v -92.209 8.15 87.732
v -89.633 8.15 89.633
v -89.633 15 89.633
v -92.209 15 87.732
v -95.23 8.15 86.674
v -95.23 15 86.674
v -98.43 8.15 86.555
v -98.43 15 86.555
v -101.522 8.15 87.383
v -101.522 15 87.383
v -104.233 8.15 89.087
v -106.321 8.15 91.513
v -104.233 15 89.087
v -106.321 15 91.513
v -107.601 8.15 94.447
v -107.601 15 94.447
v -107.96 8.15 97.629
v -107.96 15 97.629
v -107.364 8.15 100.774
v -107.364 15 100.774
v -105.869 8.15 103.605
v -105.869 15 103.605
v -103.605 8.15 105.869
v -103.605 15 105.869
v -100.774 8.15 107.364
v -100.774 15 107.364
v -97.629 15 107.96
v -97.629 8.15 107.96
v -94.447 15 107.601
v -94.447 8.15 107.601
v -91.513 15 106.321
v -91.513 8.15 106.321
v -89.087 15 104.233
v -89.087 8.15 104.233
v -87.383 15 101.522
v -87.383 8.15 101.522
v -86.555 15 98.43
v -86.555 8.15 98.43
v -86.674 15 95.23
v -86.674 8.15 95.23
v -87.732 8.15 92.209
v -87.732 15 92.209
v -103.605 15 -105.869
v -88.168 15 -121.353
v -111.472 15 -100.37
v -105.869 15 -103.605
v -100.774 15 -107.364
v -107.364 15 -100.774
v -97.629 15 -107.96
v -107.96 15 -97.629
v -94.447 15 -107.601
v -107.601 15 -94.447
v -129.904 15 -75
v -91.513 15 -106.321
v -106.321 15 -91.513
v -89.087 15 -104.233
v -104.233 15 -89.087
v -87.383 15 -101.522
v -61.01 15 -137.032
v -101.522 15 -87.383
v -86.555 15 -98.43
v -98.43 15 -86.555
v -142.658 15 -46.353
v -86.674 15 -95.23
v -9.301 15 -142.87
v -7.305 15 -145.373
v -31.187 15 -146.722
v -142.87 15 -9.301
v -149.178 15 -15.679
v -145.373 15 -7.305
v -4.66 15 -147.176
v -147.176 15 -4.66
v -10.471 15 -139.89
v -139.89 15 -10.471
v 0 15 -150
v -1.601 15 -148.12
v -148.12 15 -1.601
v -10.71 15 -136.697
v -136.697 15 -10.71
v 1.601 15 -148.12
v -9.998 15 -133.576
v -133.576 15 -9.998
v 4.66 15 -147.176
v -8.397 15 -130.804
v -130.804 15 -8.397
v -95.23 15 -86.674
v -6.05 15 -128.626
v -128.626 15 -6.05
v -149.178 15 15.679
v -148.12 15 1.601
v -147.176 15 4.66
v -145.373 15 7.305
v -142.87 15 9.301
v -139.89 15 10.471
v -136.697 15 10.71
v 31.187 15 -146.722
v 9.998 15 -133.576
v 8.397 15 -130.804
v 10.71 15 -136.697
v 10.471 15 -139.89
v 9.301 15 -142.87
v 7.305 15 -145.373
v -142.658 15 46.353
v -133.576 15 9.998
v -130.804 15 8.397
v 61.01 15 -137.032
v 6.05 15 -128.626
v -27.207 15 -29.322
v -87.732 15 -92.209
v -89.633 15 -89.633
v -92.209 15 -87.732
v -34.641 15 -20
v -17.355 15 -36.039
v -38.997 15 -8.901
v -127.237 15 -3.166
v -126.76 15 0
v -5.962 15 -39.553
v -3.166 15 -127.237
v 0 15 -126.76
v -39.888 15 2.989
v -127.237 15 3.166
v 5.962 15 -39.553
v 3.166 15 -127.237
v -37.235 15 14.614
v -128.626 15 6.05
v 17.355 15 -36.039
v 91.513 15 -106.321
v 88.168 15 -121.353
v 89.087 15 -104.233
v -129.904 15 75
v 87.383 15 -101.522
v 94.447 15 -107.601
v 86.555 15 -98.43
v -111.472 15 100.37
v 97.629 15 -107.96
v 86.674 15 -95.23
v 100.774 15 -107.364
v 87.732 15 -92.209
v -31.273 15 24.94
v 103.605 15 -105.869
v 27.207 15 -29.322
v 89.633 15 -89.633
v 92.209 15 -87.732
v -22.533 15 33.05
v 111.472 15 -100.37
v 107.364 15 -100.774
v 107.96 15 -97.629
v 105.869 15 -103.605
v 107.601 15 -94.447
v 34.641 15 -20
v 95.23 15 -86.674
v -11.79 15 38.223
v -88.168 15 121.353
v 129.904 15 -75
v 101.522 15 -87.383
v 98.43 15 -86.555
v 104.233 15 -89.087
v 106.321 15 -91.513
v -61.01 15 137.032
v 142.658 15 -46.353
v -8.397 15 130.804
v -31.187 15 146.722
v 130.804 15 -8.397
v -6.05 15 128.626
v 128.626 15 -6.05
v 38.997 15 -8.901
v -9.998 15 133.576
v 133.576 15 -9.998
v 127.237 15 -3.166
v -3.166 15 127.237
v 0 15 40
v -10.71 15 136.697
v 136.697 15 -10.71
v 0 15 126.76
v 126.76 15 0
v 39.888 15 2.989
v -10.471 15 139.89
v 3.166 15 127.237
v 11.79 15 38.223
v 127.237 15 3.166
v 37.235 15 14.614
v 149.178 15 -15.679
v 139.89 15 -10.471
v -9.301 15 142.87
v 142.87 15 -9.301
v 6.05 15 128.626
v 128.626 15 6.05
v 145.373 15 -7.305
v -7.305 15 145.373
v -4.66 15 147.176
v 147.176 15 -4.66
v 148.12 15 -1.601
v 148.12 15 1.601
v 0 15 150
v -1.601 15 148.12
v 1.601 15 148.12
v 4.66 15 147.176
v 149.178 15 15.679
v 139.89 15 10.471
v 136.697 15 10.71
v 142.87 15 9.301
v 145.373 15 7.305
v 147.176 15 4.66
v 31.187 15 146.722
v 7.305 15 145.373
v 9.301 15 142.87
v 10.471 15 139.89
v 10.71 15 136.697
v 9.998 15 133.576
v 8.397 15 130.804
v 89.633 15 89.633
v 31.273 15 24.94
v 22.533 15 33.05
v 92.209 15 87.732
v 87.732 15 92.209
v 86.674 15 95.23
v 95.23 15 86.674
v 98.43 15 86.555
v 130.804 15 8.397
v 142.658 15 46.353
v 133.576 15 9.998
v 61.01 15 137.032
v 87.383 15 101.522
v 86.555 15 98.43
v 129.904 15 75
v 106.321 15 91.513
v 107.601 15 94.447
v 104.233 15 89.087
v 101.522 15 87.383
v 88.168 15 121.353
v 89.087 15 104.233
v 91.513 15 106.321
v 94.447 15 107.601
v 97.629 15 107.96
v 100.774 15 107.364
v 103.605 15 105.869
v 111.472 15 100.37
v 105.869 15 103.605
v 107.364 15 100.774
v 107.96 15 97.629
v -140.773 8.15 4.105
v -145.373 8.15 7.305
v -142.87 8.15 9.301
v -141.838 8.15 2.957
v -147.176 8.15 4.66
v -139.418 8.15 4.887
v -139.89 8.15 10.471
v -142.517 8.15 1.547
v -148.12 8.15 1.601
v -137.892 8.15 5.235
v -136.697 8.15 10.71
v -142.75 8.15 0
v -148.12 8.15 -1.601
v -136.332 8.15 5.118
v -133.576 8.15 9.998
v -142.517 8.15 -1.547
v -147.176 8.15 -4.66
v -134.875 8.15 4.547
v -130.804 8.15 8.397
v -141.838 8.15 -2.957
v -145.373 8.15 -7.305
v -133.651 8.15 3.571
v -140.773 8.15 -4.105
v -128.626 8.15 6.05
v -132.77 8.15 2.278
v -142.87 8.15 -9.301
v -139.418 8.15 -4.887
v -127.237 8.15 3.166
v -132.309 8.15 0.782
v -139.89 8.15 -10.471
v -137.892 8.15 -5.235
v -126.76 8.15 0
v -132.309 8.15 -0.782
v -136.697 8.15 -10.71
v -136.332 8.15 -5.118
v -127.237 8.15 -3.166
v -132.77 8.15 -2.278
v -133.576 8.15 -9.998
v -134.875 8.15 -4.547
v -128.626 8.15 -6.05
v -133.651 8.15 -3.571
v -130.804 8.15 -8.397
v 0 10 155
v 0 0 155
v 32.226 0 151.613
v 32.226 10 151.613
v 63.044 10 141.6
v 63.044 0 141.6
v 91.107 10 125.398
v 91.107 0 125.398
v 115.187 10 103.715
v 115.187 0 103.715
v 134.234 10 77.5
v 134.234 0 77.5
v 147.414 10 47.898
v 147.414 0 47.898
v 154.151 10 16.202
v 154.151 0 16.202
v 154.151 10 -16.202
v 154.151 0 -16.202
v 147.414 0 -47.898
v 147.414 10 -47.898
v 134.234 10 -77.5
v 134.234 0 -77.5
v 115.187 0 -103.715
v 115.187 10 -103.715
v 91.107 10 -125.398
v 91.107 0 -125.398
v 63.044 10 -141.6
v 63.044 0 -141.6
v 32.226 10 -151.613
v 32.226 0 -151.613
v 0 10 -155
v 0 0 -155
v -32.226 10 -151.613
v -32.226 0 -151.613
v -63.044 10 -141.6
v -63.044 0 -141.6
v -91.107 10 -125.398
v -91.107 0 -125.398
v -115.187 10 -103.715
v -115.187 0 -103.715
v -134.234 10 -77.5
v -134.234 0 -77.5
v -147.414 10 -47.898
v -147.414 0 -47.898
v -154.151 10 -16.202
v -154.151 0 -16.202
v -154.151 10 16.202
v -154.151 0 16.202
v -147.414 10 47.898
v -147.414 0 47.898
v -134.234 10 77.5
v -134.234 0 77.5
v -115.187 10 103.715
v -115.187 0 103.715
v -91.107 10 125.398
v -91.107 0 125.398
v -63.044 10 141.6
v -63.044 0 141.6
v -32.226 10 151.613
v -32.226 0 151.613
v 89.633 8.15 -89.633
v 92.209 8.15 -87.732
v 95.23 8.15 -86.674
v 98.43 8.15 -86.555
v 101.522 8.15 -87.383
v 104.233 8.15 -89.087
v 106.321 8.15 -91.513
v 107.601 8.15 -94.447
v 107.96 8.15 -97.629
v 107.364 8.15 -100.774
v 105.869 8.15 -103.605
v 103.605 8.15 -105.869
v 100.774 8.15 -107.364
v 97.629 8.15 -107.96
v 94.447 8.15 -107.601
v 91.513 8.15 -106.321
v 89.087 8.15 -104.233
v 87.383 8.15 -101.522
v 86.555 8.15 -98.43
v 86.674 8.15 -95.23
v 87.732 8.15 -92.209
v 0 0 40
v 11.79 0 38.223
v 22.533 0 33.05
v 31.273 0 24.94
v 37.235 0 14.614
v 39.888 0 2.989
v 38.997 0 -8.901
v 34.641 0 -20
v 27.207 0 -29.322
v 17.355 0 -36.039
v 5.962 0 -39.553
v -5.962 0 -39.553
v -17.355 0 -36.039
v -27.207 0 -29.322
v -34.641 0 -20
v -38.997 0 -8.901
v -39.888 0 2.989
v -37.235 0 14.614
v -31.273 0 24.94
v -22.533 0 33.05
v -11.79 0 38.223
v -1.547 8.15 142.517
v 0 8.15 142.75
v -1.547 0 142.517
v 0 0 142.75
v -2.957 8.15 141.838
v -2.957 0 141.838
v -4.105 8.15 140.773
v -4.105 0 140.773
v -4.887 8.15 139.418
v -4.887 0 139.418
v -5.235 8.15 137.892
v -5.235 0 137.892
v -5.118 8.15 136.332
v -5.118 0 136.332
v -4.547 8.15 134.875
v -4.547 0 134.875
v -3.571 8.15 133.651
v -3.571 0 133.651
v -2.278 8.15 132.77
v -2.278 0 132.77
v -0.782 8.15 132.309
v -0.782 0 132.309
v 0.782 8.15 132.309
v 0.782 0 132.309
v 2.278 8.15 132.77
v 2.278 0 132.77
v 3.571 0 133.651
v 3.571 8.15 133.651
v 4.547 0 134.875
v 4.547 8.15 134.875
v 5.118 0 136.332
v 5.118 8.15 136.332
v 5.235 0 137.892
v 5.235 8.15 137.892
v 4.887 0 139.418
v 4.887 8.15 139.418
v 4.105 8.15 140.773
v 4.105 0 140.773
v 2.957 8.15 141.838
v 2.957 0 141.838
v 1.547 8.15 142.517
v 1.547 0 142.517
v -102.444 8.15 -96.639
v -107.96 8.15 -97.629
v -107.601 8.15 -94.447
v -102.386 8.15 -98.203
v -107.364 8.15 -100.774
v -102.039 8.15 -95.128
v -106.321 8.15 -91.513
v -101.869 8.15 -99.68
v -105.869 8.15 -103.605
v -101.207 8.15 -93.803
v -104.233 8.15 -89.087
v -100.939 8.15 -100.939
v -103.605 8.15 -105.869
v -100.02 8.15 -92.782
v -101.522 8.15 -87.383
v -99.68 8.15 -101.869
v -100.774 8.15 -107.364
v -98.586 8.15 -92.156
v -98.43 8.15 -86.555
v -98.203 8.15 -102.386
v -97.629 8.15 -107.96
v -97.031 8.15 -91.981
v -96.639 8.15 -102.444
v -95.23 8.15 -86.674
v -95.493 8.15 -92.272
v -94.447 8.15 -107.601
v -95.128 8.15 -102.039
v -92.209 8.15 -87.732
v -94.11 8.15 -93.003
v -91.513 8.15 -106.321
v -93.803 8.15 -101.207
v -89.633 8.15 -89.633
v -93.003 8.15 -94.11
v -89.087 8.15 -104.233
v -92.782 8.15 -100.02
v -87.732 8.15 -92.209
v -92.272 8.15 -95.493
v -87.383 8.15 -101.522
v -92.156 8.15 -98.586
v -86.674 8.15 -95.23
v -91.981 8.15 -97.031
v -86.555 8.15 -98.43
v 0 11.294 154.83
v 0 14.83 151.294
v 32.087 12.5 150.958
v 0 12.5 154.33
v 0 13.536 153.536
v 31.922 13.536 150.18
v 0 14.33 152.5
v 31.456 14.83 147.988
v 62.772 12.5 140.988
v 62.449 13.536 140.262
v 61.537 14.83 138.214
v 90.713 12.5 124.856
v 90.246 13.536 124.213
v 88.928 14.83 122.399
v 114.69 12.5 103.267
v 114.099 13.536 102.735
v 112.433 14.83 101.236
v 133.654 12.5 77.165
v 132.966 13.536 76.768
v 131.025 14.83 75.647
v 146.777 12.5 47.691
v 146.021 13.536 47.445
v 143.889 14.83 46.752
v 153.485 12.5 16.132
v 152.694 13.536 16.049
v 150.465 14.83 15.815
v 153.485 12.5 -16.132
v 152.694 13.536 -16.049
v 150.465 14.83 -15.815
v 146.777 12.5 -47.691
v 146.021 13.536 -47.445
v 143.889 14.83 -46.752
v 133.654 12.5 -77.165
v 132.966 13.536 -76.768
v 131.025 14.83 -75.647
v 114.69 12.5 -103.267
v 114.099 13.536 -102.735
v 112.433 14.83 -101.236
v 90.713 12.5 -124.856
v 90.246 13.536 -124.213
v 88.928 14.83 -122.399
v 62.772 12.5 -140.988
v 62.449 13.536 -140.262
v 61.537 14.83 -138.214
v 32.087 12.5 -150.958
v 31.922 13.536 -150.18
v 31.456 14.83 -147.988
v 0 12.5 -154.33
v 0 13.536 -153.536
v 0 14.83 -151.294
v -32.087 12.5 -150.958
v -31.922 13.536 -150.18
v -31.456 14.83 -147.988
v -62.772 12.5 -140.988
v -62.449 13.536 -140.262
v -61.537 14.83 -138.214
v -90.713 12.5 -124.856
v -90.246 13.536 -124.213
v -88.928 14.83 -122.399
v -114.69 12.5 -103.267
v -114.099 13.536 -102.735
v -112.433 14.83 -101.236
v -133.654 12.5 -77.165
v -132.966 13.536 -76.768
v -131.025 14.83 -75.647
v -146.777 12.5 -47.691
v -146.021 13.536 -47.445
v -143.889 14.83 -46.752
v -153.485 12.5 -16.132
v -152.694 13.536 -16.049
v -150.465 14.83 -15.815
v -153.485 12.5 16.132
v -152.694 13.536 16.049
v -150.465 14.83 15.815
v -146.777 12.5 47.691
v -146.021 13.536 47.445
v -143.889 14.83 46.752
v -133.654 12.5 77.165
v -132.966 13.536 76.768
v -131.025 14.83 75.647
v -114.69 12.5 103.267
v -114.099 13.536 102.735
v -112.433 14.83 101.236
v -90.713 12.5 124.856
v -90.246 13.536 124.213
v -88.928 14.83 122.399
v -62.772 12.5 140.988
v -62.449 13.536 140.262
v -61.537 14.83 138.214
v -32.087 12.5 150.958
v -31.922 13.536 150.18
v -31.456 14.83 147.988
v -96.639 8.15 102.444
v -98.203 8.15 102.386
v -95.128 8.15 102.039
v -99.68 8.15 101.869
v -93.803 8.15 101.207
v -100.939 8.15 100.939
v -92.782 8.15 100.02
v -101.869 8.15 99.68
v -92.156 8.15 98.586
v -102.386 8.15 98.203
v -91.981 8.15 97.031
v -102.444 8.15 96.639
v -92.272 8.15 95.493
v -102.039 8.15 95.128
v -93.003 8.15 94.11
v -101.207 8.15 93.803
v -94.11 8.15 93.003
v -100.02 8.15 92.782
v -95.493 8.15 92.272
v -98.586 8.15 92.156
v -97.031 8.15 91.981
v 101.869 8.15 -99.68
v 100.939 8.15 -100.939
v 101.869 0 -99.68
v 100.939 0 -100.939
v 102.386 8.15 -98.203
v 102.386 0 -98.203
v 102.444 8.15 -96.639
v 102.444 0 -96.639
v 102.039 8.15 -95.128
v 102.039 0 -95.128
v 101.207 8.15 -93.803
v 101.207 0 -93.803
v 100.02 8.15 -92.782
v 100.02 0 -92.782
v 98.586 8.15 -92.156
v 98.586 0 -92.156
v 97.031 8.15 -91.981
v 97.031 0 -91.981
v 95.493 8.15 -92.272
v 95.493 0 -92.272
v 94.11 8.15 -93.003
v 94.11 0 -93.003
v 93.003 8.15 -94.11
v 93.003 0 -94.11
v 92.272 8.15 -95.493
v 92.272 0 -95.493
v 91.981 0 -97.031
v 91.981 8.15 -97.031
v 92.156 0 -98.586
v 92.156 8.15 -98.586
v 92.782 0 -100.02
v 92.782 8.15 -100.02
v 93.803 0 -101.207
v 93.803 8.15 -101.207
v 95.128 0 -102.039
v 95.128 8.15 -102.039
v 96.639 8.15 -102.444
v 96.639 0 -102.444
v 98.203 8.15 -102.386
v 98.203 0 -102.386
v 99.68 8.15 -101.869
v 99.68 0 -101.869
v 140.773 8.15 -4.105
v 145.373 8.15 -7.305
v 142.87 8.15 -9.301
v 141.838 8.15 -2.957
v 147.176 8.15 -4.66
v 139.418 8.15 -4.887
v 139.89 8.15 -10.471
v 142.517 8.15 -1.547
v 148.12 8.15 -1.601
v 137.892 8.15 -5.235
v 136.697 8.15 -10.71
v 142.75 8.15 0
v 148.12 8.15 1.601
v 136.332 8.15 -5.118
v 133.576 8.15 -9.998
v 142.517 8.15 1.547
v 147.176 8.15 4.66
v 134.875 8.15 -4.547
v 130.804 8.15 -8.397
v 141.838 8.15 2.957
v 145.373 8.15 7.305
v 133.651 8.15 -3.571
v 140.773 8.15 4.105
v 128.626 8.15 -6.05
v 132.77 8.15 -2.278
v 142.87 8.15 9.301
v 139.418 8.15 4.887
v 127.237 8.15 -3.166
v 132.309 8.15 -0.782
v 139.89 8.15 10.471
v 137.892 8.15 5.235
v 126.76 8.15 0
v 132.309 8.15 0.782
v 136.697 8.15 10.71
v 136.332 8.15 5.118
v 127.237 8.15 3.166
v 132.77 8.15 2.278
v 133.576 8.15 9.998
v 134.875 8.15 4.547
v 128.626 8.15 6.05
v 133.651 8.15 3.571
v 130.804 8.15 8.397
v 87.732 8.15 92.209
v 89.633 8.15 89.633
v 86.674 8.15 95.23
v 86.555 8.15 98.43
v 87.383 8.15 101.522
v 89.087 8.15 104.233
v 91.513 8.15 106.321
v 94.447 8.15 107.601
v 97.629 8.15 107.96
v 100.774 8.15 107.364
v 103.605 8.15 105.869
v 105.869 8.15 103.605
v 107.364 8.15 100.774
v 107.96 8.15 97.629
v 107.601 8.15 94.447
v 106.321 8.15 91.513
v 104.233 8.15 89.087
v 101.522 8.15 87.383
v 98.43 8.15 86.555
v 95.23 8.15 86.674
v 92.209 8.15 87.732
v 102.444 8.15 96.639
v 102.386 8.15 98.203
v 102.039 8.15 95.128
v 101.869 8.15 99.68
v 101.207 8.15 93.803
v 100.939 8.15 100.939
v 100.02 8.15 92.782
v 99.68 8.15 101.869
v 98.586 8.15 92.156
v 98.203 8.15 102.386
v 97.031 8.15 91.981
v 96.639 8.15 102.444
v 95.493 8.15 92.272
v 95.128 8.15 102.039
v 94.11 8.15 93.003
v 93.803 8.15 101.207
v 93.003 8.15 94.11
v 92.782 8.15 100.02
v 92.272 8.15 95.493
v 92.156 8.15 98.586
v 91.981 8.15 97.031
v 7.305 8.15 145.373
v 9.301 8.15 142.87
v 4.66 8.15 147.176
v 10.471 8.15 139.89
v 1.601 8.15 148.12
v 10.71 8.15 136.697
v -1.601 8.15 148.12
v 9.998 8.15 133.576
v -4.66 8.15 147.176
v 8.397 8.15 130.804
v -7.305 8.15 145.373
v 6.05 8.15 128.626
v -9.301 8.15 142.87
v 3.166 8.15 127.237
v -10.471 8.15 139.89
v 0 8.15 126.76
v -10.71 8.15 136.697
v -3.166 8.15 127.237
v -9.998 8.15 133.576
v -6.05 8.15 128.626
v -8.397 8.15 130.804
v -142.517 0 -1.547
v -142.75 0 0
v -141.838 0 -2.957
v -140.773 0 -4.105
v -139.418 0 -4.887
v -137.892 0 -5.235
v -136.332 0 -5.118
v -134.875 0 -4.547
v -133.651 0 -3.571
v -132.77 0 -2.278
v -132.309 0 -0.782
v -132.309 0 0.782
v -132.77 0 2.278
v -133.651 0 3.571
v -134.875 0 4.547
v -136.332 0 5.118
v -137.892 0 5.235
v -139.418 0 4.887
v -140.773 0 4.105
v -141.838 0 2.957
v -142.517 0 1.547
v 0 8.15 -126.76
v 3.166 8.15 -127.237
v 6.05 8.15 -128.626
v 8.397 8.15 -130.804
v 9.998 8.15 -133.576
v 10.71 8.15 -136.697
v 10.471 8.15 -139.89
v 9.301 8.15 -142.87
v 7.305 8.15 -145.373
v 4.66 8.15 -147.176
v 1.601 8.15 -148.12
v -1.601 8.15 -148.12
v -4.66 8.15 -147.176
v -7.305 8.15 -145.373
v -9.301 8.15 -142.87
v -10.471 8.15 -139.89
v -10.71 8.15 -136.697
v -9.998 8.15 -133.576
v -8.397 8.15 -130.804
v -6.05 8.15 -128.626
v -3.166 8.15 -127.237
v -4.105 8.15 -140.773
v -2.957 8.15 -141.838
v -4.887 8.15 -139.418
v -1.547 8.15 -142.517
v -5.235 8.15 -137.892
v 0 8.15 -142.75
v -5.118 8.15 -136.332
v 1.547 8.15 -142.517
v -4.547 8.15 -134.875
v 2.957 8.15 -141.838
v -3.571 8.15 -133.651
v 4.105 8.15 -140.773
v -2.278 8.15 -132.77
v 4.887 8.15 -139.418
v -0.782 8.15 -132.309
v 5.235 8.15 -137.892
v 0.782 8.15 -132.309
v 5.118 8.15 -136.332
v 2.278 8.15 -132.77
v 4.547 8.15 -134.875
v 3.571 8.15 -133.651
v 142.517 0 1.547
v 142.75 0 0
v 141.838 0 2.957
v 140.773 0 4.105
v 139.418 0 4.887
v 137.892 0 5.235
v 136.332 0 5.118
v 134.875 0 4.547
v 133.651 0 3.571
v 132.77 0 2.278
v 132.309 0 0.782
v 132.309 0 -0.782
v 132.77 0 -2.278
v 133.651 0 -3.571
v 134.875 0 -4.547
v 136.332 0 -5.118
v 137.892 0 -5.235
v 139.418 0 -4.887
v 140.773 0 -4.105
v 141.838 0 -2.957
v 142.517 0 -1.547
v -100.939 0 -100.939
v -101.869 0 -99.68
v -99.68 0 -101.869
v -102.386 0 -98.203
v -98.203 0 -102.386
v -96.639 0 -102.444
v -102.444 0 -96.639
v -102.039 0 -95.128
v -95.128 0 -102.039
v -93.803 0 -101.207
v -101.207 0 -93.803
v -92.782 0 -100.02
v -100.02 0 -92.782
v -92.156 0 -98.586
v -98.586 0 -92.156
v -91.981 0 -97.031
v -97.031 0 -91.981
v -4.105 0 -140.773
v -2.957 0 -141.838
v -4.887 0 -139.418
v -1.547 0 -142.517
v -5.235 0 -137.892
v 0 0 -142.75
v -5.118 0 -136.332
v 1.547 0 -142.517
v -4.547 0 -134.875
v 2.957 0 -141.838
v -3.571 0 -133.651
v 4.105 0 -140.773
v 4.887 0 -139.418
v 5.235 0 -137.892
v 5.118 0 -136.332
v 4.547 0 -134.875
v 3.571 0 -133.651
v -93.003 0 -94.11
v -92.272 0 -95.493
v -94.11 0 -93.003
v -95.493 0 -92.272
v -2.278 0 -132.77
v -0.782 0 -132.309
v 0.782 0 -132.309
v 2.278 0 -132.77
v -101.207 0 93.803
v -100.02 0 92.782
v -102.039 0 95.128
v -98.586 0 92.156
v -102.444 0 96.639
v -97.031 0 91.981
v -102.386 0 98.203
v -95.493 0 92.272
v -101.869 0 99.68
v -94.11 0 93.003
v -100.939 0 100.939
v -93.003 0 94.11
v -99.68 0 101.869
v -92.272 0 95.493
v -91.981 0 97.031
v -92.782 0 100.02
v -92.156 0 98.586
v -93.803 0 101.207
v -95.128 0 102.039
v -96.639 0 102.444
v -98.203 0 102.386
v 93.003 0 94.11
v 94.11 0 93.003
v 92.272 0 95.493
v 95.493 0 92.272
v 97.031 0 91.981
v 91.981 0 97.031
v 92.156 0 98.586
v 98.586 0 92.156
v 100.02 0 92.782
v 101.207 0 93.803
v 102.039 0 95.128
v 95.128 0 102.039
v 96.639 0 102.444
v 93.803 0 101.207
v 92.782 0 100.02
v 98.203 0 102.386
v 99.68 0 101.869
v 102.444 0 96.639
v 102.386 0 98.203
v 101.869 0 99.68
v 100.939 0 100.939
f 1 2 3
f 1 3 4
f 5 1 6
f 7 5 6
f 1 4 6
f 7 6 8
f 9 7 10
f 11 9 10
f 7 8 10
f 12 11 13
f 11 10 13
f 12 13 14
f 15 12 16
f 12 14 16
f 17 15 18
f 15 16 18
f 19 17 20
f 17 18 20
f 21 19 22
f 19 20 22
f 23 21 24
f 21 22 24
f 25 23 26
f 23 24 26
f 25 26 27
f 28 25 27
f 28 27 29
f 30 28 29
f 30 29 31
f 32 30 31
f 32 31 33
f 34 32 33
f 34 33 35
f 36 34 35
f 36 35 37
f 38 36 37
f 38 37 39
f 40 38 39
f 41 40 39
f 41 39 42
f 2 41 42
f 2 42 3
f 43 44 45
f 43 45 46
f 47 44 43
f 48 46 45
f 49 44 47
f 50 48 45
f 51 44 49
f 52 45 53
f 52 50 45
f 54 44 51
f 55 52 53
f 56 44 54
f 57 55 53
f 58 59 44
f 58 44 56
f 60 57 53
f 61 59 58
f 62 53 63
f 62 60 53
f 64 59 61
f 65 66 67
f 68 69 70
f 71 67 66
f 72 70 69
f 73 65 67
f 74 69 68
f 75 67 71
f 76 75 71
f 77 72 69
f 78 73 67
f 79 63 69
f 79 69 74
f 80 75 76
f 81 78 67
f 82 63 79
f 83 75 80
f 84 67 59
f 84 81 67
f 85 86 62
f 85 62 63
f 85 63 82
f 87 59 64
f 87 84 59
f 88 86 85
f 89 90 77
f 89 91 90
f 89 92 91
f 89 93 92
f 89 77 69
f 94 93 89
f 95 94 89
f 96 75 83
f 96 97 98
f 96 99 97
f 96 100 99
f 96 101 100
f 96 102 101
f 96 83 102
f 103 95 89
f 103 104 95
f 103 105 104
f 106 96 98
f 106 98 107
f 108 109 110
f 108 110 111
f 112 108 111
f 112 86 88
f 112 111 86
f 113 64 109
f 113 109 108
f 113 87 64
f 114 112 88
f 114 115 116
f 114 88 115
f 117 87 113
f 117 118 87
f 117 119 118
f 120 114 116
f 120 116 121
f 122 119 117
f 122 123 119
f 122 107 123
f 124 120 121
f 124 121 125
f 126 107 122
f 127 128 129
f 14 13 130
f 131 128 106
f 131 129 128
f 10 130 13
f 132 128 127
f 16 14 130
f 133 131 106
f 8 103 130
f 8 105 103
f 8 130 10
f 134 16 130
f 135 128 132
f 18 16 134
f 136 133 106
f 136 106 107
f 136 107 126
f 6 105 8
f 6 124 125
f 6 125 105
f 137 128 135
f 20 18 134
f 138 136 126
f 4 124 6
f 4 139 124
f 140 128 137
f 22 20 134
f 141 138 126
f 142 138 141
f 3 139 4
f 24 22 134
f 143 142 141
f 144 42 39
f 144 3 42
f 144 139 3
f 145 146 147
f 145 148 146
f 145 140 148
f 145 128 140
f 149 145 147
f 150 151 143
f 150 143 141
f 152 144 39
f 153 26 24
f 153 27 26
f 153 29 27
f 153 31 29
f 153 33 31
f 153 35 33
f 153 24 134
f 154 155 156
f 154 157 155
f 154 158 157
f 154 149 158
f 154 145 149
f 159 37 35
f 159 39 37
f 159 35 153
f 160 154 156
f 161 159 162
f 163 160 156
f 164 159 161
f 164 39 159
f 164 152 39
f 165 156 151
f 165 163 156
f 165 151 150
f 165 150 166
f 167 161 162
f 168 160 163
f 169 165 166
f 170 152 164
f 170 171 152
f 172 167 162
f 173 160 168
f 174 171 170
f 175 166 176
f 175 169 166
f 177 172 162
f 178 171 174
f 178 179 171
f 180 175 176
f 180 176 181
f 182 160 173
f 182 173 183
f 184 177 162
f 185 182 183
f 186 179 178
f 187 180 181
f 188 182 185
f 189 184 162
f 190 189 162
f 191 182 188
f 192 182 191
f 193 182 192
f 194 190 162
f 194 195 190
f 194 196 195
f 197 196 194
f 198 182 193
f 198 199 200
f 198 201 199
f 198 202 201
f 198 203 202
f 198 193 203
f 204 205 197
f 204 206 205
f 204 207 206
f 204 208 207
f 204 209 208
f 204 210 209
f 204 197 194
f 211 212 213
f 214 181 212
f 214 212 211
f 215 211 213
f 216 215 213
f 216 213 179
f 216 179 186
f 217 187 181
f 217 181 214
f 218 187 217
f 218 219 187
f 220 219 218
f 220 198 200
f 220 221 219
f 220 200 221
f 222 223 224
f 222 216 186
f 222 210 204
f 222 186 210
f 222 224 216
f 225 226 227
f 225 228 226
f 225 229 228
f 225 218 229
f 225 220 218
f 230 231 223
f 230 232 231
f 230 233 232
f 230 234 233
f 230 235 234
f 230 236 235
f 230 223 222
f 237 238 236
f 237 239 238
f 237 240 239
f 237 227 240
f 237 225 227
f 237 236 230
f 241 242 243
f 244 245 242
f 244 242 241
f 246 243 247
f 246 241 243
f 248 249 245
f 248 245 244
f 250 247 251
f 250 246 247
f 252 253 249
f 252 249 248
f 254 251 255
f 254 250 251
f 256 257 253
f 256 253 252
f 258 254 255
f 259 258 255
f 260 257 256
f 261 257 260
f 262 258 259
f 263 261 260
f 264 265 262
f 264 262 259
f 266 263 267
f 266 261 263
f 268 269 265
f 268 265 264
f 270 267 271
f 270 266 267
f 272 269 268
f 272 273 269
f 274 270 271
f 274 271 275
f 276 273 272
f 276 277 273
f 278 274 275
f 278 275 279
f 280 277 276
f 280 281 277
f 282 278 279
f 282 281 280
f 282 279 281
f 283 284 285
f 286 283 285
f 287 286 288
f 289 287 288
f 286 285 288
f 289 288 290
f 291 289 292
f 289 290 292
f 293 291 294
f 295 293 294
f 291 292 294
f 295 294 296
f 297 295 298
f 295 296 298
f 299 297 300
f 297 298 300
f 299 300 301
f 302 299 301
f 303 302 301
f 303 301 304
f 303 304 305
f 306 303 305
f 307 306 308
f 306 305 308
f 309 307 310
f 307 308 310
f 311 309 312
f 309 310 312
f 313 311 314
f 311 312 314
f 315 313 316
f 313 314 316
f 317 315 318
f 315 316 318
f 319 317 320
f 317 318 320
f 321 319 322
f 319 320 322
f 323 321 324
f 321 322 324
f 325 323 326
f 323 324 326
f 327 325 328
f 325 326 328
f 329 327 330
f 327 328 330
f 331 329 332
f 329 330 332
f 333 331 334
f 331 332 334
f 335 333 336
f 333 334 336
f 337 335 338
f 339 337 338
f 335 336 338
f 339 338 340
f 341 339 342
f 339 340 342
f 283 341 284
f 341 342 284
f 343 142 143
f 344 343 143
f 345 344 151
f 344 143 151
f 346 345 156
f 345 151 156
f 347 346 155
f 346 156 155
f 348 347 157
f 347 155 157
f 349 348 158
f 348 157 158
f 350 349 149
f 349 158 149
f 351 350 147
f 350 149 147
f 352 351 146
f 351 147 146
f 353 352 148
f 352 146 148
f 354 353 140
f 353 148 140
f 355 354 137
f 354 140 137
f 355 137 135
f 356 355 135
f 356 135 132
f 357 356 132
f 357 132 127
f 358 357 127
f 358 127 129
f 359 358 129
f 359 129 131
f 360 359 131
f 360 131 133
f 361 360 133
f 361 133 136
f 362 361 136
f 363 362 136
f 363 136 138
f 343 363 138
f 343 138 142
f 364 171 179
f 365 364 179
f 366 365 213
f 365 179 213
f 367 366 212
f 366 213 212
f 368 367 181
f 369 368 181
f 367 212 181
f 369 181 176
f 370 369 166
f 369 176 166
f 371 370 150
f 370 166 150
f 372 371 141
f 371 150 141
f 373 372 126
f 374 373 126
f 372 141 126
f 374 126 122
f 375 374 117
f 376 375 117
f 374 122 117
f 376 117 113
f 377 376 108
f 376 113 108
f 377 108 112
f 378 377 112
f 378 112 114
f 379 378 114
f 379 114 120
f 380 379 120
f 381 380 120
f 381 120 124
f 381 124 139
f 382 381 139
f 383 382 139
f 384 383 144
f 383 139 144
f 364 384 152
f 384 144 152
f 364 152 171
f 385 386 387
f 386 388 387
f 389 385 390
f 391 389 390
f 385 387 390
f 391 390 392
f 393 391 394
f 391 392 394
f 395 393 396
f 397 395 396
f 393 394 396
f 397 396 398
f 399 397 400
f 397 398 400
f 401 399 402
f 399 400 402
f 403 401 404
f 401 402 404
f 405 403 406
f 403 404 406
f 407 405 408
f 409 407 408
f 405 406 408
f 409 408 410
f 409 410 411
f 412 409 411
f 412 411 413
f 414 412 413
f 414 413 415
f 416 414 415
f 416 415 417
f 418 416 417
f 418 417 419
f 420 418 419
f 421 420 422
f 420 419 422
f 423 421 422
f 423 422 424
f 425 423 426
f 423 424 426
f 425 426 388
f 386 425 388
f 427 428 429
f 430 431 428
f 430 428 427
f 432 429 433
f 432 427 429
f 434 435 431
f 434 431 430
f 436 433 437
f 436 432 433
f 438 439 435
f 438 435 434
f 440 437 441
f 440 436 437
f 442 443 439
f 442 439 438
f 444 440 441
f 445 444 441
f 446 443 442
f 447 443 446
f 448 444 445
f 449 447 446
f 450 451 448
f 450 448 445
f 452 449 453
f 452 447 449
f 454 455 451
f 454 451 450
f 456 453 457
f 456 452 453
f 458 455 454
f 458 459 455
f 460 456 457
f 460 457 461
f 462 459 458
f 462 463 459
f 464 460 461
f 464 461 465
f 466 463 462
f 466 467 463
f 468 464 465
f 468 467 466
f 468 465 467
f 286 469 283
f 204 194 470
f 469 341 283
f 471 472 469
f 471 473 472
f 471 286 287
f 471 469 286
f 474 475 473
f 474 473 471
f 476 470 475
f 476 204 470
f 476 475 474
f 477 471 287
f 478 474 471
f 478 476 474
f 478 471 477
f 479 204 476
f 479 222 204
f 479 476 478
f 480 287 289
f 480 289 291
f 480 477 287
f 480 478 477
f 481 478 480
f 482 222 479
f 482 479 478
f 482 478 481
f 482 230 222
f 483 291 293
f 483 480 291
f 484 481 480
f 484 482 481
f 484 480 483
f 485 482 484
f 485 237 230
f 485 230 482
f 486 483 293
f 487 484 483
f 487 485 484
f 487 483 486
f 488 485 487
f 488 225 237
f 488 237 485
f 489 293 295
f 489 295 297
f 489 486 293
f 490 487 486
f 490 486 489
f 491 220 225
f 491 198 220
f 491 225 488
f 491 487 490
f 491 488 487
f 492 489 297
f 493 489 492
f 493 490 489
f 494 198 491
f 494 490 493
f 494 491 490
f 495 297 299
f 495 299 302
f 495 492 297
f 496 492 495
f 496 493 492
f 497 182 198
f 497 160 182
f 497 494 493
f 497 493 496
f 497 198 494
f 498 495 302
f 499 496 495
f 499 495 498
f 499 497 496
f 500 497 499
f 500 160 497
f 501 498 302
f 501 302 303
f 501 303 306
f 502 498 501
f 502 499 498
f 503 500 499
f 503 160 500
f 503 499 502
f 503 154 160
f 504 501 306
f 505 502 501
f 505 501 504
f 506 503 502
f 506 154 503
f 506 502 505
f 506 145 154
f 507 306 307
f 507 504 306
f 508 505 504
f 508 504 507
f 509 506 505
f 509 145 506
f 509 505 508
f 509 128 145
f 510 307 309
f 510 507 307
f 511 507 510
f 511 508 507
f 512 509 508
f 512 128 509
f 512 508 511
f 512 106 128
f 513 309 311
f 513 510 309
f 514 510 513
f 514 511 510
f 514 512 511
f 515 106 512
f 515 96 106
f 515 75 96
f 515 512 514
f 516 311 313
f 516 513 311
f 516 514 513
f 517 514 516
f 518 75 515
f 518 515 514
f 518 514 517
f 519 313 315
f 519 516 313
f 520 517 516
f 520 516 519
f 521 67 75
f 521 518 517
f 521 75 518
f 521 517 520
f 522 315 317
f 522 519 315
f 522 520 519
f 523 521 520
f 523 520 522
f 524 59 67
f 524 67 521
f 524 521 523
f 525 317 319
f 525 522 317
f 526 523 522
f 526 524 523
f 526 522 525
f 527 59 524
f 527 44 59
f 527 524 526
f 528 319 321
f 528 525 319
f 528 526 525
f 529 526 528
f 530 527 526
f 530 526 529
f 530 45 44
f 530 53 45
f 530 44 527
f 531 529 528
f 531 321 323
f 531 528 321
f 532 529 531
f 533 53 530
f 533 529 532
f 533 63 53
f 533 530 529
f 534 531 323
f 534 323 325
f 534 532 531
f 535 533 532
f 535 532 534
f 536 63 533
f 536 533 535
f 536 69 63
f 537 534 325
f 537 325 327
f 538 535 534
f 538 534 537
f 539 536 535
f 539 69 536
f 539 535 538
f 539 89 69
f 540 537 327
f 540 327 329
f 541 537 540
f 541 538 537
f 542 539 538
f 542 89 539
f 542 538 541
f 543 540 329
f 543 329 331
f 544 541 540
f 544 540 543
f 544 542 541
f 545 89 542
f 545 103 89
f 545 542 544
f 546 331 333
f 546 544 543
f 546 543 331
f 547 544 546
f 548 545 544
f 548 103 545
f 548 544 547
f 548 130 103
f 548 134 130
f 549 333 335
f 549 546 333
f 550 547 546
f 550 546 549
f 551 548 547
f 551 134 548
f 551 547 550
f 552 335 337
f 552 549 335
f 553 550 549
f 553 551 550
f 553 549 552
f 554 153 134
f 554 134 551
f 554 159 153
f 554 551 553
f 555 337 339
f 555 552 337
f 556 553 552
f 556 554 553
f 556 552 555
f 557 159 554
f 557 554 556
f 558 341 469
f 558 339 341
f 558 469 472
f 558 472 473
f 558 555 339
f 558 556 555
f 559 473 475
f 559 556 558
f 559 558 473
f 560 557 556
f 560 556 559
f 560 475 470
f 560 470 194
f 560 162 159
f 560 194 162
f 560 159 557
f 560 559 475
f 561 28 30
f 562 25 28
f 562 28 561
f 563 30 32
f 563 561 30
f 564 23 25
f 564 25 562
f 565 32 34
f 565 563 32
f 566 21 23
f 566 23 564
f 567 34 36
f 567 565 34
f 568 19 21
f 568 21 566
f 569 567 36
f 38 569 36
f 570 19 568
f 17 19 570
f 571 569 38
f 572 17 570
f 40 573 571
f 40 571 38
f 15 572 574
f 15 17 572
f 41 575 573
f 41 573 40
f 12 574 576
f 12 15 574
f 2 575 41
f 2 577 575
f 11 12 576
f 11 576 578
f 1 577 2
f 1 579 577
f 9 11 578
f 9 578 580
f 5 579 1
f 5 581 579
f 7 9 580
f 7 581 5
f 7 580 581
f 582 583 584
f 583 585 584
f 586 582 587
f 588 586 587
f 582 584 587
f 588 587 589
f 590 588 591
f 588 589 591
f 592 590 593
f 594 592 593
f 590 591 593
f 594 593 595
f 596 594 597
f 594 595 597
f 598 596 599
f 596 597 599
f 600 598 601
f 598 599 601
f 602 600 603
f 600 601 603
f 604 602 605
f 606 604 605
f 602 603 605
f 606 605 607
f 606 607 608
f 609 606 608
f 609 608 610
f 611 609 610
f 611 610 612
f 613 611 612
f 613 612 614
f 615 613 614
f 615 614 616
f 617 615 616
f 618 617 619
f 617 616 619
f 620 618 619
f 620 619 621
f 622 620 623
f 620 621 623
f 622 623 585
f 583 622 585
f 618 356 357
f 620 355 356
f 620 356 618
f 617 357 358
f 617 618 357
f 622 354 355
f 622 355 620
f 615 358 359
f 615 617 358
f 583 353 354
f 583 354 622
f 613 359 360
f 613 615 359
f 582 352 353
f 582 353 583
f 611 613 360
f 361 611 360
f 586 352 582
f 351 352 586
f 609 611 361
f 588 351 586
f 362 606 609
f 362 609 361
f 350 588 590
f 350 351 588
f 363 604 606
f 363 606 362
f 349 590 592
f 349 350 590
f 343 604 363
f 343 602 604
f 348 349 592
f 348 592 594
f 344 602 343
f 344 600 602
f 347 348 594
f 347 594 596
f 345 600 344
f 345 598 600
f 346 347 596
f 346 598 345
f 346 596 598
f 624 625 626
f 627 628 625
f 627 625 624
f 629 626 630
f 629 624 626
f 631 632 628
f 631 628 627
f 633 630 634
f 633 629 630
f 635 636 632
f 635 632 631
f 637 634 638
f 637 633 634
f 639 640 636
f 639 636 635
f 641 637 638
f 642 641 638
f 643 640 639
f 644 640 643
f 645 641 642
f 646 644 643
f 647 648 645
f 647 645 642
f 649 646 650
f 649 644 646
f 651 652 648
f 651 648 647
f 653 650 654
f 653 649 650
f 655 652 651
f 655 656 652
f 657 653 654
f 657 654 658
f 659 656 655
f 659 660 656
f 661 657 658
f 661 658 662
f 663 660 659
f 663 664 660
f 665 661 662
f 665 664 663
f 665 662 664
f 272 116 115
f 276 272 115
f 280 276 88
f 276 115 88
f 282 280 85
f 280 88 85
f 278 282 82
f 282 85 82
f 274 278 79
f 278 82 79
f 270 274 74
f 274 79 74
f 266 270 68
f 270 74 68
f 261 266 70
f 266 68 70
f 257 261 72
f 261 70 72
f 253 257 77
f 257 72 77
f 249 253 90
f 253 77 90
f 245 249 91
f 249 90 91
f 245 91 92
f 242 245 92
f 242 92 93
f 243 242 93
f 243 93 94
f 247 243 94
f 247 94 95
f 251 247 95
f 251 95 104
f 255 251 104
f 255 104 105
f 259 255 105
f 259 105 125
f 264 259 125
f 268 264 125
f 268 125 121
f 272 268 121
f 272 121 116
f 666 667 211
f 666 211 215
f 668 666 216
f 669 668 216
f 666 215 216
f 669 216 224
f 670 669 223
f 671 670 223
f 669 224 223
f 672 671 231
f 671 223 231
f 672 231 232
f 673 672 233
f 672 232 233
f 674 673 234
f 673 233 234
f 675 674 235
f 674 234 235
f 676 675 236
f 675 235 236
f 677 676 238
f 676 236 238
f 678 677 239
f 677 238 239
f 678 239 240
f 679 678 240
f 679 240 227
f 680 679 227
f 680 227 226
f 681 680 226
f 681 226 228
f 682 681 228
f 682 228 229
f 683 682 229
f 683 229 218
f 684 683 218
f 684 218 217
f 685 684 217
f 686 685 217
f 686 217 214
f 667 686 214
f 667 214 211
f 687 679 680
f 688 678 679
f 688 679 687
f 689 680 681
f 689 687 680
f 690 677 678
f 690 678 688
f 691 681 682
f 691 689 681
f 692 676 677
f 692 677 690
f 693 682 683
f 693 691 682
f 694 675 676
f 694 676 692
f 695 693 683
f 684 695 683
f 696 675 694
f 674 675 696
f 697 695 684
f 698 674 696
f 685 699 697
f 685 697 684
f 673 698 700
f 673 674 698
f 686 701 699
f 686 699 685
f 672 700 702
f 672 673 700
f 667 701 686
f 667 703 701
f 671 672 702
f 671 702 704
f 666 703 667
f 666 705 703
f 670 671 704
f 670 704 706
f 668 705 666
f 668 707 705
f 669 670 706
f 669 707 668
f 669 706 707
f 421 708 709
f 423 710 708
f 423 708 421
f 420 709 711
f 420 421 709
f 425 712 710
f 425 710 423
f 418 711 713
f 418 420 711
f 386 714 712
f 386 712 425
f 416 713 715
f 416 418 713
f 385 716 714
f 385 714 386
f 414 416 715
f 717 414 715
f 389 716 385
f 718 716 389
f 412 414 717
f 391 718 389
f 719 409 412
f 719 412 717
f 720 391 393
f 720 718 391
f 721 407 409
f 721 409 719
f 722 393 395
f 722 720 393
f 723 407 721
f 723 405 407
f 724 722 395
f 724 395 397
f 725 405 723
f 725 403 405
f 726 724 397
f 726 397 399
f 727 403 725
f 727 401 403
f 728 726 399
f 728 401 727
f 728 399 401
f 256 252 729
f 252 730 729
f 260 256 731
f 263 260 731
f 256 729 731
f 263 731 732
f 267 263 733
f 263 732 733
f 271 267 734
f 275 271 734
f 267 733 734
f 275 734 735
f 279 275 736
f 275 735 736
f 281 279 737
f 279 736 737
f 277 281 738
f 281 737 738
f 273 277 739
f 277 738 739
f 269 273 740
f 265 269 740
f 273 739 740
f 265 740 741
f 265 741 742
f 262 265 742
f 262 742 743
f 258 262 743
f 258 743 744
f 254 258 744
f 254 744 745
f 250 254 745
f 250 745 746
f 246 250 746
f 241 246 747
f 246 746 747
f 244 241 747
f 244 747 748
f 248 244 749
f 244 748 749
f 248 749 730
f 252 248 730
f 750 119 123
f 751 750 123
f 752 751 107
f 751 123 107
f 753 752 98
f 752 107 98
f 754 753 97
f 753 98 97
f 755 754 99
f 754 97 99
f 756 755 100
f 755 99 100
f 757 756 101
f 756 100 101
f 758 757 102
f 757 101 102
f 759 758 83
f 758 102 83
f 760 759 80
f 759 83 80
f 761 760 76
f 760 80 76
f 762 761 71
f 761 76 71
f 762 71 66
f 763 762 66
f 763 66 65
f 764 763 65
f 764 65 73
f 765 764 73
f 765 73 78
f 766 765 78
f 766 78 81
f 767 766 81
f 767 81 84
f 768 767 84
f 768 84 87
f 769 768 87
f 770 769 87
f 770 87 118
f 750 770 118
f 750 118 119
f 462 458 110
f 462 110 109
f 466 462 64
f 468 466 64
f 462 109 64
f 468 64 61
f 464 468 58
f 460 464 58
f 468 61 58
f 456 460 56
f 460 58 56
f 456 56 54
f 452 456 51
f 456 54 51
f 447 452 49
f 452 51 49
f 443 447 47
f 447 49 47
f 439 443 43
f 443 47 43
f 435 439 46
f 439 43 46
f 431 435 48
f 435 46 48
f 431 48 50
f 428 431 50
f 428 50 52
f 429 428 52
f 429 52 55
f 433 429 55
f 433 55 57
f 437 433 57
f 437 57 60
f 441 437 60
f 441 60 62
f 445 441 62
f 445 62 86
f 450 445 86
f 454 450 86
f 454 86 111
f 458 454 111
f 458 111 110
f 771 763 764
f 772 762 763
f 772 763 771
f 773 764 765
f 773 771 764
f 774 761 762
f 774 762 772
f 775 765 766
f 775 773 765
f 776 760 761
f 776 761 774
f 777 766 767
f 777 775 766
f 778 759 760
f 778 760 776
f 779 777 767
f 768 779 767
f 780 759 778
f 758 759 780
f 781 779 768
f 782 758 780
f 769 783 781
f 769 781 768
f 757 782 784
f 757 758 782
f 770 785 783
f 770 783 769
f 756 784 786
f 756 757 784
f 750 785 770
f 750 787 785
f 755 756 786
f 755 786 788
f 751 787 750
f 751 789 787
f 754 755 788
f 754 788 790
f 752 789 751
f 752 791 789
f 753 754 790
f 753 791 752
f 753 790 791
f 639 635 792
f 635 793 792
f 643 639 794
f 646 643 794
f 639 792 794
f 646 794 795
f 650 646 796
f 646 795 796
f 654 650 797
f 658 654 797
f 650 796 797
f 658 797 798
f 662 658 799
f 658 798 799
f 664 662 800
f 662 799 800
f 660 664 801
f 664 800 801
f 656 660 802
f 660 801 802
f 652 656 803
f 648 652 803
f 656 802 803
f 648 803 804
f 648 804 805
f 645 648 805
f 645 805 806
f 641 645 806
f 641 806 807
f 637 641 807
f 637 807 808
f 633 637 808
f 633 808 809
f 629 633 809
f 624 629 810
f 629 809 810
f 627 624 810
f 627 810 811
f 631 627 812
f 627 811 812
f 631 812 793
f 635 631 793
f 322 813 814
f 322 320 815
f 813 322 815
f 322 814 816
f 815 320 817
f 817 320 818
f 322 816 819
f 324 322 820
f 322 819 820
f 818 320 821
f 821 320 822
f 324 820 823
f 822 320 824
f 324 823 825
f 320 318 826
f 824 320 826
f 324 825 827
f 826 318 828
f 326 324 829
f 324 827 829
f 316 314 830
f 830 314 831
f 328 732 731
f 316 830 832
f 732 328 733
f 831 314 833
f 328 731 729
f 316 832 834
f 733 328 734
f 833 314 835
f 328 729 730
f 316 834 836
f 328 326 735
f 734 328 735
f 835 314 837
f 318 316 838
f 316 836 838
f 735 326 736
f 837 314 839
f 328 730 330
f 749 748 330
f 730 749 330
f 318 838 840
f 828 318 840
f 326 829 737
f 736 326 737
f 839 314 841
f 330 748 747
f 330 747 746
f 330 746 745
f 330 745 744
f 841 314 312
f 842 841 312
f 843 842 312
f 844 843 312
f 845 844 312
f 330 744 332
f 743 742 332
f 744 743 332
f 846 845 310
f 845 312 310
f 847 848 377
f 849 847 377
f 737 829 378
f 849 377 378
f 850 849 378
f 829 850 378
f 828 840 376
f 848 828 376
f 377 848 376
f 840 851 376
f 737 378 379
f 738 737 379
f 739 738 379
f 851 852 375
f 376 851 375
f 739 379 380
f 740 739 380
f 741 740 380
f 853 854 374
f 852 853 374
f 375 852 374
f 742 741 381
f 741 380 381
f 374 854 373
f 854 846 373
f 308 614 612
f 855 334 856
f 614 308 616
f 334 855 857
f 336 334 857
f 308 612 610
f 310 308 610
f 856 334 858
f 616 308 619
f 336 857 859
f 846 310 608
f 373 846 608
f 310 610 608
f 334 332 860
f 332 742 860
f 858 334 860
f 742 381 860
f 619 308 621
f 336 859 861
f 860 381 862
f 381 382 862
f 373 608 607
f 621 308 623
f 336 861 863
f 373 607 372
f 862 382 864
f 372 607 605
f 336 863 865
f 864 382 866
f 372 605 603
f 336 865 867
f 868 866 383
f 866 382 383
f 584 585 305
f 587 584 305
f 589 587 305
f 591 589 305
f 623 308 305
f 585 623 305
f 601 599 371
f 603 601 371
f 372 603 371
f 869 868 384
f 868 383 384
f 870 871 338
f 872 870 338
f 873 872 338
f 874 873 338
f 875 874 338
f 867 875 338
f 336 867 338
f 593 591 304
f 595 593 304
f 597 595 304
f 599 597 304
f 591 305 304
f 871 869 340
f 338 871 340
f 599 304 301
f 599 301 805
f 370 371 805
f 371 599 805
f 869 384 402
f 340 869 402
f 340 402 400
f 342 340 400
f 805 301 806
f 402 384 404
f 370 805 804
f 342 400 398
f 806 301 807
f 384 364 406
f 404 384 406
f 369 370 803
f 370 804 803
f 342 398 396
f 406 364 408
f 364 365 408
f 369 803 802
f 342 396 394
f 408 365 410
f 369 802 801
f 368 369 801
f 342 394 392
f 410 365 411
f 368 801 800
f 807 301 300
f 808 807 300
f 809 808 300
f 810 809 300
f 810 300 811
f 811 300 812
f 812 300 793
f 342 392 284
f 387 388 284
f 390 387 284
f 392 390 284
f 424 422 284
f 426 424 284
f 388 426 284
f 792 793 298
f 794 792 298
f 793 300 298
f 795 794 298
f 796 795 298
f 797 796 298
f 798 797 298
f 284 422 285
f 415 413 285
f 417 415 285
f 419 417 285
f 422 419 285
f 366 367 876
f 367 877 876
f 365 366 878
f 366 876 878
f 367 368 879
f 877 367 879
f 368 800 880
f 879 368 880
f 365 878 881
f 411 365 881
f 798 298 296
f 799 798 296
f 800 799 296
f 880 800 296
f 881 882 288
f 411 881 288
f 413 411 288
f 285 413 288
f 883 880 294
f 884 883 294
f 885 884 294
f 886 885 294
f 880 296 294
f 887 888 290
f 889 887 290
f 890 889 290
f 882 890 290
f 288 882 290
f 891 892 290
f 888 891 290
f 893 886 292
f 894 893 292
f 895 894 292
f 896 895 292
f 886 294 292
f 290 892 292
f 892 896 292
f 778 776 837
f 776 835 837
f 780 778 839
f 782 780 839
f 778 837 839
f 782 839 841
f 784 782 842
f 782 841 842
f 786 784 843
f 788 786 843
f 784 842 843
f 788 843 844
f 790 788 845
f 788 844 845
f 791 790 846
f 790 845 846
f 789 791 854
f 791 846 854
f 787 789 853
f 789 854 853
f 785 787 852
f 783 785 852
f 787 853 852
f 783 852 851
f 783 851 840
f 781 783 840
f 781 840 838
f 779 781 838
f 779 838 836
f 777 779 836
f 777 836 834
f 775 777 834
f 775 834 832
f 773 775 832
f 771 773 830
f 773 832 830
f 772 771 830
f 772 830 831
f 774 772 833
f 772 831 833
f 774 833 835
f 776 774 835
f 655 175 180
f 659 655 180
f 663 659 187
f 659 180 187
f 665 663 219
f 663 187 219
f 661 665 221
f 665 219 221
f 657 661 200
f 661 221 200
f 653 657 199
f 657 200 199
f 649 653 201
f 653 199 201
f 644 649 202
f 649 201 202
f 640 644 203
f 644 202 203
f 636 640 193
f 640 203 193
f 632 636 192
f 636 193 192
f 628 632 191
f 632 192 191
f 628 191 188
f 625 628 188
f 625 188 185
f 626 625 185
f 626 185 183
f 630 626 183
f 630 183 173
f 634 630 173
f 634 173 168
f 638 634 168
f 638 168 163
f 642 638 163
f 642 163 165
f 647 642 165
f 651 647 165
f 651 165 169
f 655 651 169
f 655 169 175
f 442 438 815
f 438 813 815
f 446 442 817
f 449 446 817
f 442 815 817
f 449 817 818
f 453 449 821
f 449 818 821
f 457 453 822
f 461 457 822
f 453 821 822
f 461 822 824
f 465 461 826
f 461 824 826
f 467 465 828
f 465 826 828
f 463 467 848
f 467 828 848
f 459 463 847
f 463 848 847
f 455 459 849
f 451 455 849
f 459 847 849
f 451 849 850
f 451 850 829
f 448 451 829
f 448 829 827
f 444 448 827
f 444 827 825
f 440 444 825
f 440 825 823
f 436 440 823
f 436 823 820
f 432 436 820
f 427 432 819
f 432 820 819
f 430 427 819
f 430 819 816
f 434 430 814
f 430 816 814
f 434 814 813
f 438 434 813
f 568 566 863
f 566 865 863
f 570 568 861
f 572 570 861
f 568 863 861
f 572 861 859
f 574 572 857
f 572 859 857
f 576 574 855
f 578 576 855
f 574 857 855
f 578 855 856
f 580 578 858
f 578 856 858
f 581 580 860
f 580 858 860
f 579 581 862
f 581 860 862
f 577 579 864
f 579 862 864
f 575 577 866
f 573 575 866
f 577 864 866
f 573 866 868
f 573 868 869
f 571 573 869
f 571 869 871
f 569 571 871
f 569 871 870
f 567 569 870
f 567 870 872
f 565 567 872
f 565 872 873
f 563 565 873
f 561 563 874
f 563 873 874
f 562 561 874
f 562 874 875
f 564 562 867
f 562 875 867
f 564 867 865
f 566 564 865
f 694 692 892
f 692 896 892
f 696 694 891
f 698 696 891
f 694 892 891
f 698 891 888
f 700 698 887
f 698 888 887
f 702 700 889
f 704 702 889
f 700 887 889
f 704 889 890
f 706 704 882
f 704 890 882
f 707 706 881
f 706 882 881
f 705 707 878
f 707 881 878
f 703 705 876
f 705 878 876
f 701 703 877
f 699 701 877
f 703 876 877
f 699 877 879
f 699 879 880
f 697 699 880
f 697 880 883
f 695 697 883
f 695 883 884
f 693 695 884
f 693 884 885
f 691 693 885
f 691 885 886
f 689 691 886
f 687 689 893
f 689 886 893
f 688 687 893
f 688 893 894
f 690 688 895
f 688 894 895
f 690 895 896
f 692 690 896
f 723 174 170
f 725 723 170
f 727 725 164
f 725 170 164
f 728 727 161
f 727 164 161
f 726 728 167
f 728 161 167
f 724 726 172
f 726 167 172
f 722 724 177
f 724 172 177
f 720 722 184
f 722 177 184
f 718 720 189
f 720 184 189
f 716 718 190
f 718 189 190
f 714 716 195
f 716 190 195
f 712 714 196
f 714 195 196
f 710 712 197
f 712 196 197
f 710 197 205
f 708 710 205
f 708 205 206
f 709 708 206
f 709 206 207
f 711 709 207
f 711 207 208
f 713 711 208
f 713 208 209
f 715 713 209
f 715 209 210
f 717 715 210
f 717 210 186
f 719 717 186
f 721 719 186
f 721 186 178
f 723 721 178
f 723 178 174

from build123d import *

# Parameters (mm, degrees)
SKETCH1_R                                = 155
BOSS_EXTRUDE1_DEPTH                      = 15
CBORE_FOR_M10_HEX_HEAD_BOLT1_D           = 10.5
CBORE_FOR_M10_HEX_HEAD_BOLT1_CBORE_D     = 21.48
CBORE_FOR_M10_HEX_HEAD_BOLT1_CBORE_DEPTH = 6.85
CIRPATTERN1_COUNT                        = 8
SKETCH2_R                                = 40
CUT_EXTRUDE1_DEPTH                       = 15
FILLET1_R                                = 5


with BuildPart() as part:
    # Sketch1 → Boss-Extrude1 (new body)
    with BuildSketch(Plane(origin=(0, 0, 0), x_dir=(1, 0, 0), z_dir=(0, 1, 0))):
        with Locations(Location((0, 0, 0), (0, 0, 270))):
            Circle(SKETCH1_R)
    extrude(amount=BOSS_EXTRUDE1_DEPTH)

    # CBORE for M10 Hex Head Bolt1 (through all)
    with Locations(Plane(origin=(0, 15, -137.5), x_dir=(0, 0, 1), z_dir=(0, 1, 0))):
        with Locations((0, 0)):
            cbore_for_m10_hex_head_bolt1 = CounterBoreHole(CBORE_FOR_M10_HEX_HEAD_BOLT1_D / 2, CBORE_FOR_M10_HEX_HEAD_BOLT1_CBORE_D / 2, CBORE_FOR_M10_HEX_HEAD_BOLT1_CBORE_DEPTH)

    # CirPattern1: CBORE for M10 Hex Head Bolt1 ×8 about axis
    cirpattern1_axis = Axis((0, 0, 0), (0, 1, 0))
    for i in range(1, CIRPATTERN1_COUNT):
        add(cbore_for_m10_hex_head_bolt1.rotate(cirpattern1_axis, i * 360 / CIRPATTERN1_COUNT), mode=Mode.SUBTRACT)

    # Sketch2 → Cut-Extrude1 (cut)
    with BuildSketch(Plane(origin=(0, 15, 0), x_dir=(1, 0, 0), z_dir=(0, 1, 0))):
        with Locations(Location((0, 0, 0), (0, 0, 270))):
            Circle(SKETCH2_R)
    extrude(amount=-CUT_EXTRUDE1_DEPTH, mode=Mode.SUBTRACT)

    # Fillet1
    fillet1_edges = [part.edges().sort_by_distance(p)[0] for p in [
        (0, 15, -155),
    ]]
    fillet(fillet1_edges, radius=FILLET1_R)


solid = part.part
